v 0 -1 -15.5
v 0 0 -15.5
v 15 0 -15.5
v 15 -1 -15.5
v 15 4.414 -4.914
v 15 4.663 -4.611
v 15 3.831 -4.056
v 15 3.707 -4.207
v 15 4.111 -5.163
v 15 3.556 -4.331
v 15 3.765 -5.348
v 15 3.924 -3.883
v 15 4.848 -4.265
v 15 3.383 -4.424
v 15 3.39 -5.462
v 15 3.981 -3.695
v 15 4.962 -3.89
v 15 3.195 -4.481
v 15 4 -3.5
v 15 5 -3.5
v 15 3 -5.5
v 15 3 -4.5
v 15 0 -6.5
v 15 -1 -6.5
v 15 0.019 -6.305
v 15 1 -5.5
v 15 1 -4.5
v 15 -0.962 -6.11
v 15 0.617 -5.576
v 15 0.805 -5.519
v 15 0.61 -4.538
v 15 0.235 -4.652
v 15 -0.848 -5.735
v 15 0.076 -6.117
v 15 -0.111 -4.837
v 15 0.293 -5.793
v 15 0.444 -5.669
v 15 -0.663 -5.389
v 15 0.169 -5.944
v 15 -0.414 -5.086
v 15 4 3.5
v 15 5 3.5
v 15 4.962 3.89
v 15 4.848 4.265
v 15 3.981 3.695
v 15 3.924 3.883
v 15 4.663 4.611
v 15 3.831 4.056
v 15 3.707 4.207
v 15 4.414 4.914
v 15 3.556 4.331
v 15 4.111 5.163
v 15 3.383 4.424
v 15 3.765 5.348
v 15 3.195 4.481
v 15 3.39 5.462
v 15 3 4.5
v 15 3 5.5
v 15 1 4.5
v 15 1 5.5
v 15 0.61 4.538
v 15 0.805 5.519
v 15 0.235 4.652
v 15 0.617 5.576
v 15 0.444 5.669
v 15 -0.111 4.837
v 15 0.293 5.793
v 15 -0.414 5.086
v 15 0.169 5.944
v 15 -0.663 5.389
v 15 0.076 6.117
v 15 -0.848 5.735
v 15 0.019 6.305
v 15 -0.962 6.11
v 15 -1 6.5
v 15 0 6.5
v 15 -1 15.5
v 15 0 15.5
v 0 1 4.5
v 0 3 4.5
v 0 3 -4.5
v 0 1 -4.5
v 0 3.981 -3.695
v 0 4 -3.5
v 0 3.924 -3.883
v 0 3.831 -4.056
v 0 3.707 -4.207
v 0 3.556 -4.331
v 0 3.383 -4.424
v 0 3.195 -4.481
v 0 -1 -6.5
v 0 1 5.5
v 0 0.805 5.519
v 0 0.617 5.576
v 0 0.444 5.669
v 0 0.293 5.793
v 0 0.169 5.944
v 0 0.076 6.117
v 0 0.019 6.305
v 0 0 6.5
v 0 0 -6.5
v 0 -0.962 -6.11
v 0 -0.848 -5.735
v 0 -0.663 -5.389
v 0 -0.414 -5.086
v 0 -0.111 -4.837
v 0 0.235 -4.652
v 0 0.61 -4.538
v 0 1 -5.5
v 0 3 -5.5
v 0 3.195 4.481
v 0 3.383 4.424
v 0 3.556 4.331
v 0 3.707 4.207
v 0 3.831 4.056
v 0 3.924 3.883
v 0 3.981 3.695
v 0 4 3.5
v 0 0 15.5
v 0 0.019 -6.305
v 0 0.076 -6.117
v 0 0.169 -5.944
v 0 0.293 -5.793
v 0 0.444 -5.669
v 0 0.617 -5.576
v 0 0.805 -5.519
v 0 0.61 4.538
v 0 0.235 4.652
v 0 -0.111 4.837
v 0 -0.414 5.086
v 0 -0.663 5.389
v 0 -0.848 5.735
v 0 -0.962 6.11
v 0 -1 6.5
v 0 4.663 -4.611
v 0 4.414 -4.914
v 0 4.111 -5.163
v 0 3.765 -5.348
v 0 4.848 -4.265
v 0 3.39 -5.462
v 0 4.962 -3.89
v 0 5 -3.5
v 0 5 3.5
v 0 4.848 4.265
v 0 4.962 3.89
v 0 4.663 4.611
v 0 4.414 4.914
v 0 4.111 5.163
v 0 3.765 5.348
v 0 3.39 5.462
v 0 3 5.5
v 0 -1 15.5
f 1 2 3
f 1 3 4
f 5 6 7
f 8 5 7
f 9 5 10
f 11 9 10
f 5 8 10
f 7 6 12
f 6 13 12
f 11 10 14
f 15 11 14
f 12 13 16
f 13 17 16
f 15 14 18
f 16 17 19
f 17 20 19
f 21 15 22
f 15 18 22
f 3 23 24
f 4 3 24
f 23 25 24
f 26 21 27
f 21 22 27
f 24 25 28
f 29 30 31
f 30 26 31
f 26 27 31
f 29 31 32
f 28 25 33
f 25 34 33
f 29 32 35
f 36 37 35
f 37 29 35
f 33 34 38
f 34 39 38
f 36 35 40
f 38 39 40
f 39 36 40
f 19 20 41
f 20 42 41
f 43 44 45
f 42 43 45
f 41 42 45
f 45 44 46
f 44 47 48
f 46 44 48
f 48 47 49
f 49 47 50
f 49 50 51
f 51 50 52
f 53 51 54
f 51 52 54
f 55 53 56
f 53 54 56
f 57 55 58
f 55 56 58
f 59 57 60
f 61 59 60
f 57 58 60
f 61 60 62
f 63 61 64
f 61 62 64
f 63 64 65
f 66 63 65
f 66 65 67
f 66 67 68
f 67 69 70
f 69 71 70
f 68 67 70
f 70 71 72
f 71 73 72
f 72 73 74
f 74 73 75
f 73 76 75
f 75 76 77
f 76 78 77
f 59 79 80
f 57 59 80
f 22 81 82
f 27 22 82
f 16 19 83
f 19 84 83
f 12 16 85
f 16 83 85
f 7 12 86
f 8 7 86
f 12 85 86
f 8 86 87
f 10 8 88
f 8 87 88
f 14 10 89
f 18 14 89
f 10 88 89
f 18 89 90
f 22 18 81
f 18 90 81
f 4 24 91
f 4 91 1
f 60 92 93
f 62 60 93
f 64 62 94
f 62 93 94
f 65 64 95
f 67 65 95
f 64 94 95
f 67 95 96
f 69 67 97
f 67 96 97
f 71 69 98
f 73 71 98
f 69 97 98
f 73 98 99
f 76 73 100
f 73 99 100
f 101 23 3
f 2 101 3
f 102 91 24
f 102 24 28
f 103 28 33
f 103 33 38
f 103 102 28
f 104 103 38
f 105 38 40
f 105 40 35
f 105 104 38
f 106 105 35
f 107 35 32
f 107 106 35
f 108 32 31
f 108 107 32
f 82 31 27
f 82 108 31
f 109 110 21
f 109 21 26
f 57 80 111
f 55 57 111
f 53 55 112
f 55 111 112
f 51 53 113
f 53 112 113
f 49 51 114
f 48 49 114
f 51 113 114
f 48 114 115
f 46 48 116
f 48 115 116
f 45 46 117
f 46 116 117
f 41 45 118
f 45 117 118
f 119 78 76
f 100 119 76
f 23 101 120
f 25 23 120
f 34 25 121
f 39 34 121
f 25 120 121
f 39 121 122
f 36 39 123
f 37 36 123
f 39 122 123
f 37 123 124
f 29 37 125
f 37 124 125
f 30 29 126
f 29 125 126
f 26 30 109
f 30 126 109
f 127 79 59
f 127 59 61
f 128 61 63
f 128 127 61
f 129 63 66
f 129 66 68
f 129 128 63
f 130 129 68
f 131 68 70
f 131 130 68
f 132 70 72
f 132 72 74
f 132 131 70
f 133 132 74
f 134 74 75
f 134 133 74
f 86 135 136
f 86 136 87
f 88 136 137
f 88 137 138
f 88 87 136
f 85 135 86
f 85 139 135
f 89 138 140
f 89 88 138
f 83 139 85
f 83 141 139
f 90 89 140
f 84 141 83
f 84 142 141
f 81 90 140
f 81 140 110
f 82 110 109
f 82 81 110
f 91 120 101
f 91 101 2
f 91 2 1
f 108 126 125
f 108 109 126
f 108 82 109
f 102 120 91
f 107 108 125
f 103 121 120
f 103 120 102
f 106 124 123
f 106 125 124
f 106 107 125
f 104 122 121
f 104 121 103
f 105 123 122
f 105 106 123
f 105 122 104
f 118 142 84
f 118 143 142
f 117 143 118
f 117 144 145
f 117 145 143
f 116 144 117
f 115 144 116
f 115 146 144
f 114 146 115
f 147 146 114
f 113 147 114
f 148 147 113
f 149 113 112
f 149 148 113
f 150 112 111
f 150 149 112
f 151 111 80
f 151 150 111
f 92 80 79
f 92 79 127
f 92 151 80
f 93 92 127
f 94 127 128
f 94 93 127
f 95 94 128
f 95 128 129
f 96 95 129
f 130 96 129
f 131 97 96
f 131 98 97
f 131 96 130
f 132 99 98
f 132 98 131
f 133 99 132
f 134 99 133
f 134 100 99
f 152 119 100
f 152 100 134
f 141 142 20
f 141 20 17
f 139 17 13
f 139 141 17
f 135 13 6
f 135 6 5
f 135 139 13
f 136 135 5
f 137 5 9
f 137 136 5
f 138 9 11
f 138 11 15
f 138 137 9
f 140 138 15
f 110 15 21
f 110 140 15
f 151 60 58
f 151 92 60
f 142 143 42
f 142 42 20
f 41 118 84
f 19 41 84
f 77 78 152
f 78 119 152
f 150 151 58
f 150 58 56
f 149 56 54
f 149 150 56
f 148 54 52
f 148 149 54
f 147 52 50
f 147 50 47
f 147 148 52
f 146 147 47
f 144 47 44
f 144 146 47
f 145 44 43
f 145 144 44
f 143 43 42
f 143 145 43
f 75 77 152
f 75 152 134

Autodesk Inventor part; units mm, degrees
ref_plane "YZ Plane" through (0, 0, 0) normal (1, 0, 0) x (0, 1, 0)
ref_plane "XZ Plane" through (0, 0, 0) normal (0, 1, 0) x (-1, 0, 0)
ref_plane "XY Plane" through (0, 0, 0) normal (0, 0, 1) x (1, 0, 0)
sketch "Sketch8" plane through (0, 0, 0) normal (1, 0, 0) x (0, 1, 0)
  line L0 (0, 15.5) -> (0, 5.5)
  line L1 (0, 5.5) -> (5, 5.5)
  line L2 (5, 5.5) -> (5, -5.5)
  line L3 (5, -5.5) -> (0, -5.5)
  line L4 (0, -5.5) -> (0, -15.5)
  point P0 (0, 0)
  point P1 (5, 0)
  dimension "d39" = 11
  dimension "d40" = 5
  dimension "d41" = 10
  dimension "d42" = 10
contour flange "Contour Flange1" sketch "Sketch8" thickness 1 bend radius 1 width 15 along (1, 0, 0) mid plane no both sides no wall seen from (0, 0, 10.5) lies toward (0, -1, 0) curves L0 L1 L2 L3 L4
bend "Bend1"
corner "Corner1"
equation "\"d29\" = BendReliefWidth"
equation "\"d30\" = BendReliefDepth"
equation "\"d31\" = MinimumRemnant"
equation "\"d32\" = BendRadius"
equation "\"d34\" = BendRadius"
equation "\"d36\" = CornerReliefSize"
equation "\"d37\" = GapSize"
equation "\"d38\" = JacobiRadiusSize"
equation "\"BendRadius\" = Thickness"
equation "\"BendReliefWidth\" = Thickness"
equation "\"BendReliefDepth\" = 0.5 * Thickness"
equation "\"CornerReliefSize\" = 4 * Thickness"
equation "\"MinimumRemnant\" = 2 * Thickness"
equation "\"TransitionRadius\" = BendRadius"
equation "\"JacobiRadiusSize\" = Thickness"
equation "\"GapSize\" = Thickness"
equation "\"d23\" = BendRadius"
equation "\"Thickness\" = 1"
properties part number "M18 - Aluminum Bracket" material "Aluminum 6061"
